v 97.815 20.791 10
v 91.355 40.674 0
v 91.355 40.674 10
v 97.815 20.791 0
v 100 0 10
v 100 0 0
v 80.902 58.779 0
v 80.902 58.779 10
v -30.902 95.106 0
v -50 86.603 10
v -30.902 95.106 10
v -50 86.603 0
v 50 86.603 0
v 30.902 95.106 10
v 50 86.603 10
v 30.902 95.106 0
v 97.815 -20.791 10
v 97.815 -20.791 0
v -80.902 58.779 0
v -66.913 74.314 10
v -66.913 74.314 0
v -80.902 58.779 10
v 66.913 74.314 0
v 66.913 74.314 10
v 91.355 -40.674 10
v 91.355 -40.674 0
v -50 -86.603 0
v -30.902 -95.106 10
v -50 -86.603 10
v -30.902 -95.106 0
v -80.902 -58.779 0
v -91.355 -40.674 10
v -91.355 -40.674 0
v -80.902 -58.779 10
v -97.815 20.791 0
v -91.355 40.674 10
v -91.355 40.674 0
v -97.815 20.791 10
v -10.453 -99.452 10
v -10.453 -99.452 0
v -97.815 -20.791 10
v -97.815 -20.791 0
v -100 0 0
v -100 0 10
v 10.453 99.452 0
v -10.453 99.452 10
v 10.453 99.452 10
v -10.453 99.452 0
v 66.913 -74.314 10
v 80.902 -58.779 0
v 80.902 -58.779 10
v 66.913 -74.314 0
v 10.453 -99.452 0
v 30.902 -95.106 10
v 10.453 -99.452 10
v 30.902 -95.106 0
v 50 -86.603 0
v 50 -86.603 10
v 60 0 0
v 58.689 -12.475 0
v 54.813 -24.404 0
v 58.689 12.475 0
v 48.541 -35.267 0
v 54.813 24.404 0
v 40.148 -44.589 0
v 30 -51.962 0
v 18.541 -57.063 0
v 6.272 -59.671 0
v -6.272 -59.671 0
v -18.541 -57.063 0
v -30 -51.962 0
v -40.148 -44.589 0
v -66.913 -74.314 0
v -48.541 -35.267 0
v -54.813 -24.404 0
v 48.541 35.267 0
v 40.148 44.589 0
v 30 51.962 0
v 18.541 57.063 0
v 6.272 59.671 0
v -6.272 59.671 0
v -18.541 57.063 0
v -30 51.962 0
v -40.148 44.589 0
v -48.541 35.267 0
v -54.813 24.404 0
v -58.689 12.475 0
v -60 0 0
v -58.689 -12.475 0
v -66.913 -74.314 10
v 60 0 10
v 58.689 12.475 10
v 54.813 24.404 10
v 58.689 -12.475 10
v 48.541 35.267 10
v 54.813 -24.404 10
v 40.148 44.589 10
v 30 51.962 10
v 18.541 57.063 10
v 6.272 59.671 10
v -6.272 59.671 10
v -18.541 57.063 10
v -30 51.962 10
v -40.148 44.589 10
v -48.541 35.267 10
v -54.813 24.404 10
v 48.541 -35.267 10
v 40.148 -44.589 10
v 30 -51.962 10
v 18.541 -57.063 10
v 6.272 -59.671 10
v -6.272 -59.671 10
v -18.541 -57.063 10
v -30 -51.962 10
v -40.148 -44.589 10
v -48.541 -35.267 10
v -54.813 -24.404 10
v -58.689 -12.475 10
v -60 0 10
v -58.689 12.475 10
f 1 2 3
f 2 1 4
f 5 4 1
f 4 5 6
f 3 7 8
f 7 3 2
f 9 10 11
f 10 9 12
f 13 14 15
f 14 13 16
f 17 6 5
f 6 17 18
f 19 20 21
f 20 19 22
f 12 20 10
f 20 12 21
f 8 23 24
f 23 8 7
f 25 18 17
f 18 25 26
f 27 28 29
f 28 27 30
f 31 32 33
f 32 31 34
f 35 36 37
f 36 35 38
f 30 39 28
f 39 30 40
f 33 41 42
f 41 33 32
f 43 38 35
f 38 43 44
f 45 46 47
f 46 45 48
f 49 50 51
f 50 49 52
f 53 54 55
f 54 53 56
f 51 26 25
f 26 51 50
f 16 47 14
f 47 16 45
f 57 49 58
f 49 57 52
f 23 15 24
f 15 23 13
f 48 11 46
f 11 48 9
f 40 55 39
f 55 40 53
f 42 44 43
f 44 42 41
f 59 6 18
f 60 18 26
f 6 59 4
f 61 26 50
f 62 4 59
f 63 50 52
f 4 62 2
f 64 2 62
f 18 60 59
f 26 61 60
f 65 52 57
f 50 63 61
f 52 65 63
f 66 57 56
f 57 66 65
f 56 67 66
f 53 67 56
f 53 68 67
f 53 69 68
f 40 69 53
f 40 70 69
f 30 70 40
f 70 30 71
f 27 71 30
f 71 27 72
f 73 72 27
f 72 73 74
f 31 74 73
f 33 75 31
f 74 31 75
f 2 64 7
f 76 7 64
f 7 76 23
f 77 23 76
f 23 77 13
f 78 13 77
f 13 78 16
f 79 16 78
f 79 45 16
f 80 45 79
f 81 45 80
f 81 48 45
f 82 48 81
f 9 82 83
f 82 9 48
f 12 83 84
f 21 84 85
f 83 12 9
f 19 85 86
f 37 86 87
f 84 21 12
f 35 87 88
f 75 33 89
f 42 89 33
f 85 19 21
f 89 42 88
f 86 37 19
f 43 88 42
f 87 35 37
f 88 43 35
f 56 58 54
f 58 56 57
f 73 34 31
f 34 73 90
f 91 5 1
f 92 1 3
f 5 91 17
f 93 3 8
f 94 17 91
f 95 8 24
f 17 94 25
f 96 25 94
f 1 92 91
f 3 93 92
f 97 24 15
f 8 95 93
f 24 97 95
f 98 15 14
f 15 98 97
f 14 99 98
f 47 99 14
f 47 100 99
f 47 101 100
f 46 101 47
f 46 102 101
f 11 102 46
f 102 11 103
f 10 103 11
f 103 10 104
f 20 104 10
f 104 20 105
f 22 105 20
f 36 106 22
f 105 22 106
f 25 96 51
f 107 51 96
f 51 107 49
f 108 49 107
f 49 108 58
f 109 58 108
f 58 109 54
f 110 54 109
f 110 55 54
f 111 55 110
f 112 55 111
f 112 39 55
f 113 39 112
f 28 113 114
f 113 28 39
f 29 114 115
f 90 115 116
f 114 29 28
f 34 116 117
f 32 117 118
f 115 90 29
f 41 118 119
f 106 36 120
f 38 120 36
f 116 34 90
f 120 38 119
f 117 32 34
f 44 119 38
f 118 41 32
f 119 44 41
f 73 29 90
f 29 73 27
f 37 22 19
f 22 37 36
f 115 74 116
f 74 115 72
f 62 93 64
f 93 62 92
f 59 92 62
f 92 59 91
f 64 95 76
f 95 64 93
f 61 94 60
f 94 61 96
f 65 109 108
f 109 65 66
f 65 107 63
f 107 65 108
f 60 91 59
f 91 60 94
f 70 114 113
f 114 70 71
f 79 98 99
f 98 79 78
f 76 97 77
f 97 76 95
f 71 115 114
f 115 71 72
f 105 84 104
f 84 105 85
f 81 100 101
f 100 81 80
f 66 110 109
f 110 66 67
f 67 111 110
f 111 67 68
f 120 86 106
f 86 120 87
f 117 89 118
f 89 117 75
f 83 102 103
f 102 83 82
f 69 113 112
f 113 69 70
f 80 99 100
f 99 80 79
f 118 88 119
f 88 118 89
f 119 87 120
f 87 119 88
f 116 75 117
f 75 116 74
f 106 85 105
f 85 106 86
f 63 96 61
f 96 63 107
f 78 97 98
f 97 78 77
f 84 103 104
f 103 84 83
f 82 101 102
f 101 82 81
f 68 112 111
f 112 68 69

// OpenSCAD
//color("green") cylinder(h=100, r = 10);



color("green") difference() {
    cylinder(h=10, r = 100);
    cylinder(h=10, r = 60);
}
